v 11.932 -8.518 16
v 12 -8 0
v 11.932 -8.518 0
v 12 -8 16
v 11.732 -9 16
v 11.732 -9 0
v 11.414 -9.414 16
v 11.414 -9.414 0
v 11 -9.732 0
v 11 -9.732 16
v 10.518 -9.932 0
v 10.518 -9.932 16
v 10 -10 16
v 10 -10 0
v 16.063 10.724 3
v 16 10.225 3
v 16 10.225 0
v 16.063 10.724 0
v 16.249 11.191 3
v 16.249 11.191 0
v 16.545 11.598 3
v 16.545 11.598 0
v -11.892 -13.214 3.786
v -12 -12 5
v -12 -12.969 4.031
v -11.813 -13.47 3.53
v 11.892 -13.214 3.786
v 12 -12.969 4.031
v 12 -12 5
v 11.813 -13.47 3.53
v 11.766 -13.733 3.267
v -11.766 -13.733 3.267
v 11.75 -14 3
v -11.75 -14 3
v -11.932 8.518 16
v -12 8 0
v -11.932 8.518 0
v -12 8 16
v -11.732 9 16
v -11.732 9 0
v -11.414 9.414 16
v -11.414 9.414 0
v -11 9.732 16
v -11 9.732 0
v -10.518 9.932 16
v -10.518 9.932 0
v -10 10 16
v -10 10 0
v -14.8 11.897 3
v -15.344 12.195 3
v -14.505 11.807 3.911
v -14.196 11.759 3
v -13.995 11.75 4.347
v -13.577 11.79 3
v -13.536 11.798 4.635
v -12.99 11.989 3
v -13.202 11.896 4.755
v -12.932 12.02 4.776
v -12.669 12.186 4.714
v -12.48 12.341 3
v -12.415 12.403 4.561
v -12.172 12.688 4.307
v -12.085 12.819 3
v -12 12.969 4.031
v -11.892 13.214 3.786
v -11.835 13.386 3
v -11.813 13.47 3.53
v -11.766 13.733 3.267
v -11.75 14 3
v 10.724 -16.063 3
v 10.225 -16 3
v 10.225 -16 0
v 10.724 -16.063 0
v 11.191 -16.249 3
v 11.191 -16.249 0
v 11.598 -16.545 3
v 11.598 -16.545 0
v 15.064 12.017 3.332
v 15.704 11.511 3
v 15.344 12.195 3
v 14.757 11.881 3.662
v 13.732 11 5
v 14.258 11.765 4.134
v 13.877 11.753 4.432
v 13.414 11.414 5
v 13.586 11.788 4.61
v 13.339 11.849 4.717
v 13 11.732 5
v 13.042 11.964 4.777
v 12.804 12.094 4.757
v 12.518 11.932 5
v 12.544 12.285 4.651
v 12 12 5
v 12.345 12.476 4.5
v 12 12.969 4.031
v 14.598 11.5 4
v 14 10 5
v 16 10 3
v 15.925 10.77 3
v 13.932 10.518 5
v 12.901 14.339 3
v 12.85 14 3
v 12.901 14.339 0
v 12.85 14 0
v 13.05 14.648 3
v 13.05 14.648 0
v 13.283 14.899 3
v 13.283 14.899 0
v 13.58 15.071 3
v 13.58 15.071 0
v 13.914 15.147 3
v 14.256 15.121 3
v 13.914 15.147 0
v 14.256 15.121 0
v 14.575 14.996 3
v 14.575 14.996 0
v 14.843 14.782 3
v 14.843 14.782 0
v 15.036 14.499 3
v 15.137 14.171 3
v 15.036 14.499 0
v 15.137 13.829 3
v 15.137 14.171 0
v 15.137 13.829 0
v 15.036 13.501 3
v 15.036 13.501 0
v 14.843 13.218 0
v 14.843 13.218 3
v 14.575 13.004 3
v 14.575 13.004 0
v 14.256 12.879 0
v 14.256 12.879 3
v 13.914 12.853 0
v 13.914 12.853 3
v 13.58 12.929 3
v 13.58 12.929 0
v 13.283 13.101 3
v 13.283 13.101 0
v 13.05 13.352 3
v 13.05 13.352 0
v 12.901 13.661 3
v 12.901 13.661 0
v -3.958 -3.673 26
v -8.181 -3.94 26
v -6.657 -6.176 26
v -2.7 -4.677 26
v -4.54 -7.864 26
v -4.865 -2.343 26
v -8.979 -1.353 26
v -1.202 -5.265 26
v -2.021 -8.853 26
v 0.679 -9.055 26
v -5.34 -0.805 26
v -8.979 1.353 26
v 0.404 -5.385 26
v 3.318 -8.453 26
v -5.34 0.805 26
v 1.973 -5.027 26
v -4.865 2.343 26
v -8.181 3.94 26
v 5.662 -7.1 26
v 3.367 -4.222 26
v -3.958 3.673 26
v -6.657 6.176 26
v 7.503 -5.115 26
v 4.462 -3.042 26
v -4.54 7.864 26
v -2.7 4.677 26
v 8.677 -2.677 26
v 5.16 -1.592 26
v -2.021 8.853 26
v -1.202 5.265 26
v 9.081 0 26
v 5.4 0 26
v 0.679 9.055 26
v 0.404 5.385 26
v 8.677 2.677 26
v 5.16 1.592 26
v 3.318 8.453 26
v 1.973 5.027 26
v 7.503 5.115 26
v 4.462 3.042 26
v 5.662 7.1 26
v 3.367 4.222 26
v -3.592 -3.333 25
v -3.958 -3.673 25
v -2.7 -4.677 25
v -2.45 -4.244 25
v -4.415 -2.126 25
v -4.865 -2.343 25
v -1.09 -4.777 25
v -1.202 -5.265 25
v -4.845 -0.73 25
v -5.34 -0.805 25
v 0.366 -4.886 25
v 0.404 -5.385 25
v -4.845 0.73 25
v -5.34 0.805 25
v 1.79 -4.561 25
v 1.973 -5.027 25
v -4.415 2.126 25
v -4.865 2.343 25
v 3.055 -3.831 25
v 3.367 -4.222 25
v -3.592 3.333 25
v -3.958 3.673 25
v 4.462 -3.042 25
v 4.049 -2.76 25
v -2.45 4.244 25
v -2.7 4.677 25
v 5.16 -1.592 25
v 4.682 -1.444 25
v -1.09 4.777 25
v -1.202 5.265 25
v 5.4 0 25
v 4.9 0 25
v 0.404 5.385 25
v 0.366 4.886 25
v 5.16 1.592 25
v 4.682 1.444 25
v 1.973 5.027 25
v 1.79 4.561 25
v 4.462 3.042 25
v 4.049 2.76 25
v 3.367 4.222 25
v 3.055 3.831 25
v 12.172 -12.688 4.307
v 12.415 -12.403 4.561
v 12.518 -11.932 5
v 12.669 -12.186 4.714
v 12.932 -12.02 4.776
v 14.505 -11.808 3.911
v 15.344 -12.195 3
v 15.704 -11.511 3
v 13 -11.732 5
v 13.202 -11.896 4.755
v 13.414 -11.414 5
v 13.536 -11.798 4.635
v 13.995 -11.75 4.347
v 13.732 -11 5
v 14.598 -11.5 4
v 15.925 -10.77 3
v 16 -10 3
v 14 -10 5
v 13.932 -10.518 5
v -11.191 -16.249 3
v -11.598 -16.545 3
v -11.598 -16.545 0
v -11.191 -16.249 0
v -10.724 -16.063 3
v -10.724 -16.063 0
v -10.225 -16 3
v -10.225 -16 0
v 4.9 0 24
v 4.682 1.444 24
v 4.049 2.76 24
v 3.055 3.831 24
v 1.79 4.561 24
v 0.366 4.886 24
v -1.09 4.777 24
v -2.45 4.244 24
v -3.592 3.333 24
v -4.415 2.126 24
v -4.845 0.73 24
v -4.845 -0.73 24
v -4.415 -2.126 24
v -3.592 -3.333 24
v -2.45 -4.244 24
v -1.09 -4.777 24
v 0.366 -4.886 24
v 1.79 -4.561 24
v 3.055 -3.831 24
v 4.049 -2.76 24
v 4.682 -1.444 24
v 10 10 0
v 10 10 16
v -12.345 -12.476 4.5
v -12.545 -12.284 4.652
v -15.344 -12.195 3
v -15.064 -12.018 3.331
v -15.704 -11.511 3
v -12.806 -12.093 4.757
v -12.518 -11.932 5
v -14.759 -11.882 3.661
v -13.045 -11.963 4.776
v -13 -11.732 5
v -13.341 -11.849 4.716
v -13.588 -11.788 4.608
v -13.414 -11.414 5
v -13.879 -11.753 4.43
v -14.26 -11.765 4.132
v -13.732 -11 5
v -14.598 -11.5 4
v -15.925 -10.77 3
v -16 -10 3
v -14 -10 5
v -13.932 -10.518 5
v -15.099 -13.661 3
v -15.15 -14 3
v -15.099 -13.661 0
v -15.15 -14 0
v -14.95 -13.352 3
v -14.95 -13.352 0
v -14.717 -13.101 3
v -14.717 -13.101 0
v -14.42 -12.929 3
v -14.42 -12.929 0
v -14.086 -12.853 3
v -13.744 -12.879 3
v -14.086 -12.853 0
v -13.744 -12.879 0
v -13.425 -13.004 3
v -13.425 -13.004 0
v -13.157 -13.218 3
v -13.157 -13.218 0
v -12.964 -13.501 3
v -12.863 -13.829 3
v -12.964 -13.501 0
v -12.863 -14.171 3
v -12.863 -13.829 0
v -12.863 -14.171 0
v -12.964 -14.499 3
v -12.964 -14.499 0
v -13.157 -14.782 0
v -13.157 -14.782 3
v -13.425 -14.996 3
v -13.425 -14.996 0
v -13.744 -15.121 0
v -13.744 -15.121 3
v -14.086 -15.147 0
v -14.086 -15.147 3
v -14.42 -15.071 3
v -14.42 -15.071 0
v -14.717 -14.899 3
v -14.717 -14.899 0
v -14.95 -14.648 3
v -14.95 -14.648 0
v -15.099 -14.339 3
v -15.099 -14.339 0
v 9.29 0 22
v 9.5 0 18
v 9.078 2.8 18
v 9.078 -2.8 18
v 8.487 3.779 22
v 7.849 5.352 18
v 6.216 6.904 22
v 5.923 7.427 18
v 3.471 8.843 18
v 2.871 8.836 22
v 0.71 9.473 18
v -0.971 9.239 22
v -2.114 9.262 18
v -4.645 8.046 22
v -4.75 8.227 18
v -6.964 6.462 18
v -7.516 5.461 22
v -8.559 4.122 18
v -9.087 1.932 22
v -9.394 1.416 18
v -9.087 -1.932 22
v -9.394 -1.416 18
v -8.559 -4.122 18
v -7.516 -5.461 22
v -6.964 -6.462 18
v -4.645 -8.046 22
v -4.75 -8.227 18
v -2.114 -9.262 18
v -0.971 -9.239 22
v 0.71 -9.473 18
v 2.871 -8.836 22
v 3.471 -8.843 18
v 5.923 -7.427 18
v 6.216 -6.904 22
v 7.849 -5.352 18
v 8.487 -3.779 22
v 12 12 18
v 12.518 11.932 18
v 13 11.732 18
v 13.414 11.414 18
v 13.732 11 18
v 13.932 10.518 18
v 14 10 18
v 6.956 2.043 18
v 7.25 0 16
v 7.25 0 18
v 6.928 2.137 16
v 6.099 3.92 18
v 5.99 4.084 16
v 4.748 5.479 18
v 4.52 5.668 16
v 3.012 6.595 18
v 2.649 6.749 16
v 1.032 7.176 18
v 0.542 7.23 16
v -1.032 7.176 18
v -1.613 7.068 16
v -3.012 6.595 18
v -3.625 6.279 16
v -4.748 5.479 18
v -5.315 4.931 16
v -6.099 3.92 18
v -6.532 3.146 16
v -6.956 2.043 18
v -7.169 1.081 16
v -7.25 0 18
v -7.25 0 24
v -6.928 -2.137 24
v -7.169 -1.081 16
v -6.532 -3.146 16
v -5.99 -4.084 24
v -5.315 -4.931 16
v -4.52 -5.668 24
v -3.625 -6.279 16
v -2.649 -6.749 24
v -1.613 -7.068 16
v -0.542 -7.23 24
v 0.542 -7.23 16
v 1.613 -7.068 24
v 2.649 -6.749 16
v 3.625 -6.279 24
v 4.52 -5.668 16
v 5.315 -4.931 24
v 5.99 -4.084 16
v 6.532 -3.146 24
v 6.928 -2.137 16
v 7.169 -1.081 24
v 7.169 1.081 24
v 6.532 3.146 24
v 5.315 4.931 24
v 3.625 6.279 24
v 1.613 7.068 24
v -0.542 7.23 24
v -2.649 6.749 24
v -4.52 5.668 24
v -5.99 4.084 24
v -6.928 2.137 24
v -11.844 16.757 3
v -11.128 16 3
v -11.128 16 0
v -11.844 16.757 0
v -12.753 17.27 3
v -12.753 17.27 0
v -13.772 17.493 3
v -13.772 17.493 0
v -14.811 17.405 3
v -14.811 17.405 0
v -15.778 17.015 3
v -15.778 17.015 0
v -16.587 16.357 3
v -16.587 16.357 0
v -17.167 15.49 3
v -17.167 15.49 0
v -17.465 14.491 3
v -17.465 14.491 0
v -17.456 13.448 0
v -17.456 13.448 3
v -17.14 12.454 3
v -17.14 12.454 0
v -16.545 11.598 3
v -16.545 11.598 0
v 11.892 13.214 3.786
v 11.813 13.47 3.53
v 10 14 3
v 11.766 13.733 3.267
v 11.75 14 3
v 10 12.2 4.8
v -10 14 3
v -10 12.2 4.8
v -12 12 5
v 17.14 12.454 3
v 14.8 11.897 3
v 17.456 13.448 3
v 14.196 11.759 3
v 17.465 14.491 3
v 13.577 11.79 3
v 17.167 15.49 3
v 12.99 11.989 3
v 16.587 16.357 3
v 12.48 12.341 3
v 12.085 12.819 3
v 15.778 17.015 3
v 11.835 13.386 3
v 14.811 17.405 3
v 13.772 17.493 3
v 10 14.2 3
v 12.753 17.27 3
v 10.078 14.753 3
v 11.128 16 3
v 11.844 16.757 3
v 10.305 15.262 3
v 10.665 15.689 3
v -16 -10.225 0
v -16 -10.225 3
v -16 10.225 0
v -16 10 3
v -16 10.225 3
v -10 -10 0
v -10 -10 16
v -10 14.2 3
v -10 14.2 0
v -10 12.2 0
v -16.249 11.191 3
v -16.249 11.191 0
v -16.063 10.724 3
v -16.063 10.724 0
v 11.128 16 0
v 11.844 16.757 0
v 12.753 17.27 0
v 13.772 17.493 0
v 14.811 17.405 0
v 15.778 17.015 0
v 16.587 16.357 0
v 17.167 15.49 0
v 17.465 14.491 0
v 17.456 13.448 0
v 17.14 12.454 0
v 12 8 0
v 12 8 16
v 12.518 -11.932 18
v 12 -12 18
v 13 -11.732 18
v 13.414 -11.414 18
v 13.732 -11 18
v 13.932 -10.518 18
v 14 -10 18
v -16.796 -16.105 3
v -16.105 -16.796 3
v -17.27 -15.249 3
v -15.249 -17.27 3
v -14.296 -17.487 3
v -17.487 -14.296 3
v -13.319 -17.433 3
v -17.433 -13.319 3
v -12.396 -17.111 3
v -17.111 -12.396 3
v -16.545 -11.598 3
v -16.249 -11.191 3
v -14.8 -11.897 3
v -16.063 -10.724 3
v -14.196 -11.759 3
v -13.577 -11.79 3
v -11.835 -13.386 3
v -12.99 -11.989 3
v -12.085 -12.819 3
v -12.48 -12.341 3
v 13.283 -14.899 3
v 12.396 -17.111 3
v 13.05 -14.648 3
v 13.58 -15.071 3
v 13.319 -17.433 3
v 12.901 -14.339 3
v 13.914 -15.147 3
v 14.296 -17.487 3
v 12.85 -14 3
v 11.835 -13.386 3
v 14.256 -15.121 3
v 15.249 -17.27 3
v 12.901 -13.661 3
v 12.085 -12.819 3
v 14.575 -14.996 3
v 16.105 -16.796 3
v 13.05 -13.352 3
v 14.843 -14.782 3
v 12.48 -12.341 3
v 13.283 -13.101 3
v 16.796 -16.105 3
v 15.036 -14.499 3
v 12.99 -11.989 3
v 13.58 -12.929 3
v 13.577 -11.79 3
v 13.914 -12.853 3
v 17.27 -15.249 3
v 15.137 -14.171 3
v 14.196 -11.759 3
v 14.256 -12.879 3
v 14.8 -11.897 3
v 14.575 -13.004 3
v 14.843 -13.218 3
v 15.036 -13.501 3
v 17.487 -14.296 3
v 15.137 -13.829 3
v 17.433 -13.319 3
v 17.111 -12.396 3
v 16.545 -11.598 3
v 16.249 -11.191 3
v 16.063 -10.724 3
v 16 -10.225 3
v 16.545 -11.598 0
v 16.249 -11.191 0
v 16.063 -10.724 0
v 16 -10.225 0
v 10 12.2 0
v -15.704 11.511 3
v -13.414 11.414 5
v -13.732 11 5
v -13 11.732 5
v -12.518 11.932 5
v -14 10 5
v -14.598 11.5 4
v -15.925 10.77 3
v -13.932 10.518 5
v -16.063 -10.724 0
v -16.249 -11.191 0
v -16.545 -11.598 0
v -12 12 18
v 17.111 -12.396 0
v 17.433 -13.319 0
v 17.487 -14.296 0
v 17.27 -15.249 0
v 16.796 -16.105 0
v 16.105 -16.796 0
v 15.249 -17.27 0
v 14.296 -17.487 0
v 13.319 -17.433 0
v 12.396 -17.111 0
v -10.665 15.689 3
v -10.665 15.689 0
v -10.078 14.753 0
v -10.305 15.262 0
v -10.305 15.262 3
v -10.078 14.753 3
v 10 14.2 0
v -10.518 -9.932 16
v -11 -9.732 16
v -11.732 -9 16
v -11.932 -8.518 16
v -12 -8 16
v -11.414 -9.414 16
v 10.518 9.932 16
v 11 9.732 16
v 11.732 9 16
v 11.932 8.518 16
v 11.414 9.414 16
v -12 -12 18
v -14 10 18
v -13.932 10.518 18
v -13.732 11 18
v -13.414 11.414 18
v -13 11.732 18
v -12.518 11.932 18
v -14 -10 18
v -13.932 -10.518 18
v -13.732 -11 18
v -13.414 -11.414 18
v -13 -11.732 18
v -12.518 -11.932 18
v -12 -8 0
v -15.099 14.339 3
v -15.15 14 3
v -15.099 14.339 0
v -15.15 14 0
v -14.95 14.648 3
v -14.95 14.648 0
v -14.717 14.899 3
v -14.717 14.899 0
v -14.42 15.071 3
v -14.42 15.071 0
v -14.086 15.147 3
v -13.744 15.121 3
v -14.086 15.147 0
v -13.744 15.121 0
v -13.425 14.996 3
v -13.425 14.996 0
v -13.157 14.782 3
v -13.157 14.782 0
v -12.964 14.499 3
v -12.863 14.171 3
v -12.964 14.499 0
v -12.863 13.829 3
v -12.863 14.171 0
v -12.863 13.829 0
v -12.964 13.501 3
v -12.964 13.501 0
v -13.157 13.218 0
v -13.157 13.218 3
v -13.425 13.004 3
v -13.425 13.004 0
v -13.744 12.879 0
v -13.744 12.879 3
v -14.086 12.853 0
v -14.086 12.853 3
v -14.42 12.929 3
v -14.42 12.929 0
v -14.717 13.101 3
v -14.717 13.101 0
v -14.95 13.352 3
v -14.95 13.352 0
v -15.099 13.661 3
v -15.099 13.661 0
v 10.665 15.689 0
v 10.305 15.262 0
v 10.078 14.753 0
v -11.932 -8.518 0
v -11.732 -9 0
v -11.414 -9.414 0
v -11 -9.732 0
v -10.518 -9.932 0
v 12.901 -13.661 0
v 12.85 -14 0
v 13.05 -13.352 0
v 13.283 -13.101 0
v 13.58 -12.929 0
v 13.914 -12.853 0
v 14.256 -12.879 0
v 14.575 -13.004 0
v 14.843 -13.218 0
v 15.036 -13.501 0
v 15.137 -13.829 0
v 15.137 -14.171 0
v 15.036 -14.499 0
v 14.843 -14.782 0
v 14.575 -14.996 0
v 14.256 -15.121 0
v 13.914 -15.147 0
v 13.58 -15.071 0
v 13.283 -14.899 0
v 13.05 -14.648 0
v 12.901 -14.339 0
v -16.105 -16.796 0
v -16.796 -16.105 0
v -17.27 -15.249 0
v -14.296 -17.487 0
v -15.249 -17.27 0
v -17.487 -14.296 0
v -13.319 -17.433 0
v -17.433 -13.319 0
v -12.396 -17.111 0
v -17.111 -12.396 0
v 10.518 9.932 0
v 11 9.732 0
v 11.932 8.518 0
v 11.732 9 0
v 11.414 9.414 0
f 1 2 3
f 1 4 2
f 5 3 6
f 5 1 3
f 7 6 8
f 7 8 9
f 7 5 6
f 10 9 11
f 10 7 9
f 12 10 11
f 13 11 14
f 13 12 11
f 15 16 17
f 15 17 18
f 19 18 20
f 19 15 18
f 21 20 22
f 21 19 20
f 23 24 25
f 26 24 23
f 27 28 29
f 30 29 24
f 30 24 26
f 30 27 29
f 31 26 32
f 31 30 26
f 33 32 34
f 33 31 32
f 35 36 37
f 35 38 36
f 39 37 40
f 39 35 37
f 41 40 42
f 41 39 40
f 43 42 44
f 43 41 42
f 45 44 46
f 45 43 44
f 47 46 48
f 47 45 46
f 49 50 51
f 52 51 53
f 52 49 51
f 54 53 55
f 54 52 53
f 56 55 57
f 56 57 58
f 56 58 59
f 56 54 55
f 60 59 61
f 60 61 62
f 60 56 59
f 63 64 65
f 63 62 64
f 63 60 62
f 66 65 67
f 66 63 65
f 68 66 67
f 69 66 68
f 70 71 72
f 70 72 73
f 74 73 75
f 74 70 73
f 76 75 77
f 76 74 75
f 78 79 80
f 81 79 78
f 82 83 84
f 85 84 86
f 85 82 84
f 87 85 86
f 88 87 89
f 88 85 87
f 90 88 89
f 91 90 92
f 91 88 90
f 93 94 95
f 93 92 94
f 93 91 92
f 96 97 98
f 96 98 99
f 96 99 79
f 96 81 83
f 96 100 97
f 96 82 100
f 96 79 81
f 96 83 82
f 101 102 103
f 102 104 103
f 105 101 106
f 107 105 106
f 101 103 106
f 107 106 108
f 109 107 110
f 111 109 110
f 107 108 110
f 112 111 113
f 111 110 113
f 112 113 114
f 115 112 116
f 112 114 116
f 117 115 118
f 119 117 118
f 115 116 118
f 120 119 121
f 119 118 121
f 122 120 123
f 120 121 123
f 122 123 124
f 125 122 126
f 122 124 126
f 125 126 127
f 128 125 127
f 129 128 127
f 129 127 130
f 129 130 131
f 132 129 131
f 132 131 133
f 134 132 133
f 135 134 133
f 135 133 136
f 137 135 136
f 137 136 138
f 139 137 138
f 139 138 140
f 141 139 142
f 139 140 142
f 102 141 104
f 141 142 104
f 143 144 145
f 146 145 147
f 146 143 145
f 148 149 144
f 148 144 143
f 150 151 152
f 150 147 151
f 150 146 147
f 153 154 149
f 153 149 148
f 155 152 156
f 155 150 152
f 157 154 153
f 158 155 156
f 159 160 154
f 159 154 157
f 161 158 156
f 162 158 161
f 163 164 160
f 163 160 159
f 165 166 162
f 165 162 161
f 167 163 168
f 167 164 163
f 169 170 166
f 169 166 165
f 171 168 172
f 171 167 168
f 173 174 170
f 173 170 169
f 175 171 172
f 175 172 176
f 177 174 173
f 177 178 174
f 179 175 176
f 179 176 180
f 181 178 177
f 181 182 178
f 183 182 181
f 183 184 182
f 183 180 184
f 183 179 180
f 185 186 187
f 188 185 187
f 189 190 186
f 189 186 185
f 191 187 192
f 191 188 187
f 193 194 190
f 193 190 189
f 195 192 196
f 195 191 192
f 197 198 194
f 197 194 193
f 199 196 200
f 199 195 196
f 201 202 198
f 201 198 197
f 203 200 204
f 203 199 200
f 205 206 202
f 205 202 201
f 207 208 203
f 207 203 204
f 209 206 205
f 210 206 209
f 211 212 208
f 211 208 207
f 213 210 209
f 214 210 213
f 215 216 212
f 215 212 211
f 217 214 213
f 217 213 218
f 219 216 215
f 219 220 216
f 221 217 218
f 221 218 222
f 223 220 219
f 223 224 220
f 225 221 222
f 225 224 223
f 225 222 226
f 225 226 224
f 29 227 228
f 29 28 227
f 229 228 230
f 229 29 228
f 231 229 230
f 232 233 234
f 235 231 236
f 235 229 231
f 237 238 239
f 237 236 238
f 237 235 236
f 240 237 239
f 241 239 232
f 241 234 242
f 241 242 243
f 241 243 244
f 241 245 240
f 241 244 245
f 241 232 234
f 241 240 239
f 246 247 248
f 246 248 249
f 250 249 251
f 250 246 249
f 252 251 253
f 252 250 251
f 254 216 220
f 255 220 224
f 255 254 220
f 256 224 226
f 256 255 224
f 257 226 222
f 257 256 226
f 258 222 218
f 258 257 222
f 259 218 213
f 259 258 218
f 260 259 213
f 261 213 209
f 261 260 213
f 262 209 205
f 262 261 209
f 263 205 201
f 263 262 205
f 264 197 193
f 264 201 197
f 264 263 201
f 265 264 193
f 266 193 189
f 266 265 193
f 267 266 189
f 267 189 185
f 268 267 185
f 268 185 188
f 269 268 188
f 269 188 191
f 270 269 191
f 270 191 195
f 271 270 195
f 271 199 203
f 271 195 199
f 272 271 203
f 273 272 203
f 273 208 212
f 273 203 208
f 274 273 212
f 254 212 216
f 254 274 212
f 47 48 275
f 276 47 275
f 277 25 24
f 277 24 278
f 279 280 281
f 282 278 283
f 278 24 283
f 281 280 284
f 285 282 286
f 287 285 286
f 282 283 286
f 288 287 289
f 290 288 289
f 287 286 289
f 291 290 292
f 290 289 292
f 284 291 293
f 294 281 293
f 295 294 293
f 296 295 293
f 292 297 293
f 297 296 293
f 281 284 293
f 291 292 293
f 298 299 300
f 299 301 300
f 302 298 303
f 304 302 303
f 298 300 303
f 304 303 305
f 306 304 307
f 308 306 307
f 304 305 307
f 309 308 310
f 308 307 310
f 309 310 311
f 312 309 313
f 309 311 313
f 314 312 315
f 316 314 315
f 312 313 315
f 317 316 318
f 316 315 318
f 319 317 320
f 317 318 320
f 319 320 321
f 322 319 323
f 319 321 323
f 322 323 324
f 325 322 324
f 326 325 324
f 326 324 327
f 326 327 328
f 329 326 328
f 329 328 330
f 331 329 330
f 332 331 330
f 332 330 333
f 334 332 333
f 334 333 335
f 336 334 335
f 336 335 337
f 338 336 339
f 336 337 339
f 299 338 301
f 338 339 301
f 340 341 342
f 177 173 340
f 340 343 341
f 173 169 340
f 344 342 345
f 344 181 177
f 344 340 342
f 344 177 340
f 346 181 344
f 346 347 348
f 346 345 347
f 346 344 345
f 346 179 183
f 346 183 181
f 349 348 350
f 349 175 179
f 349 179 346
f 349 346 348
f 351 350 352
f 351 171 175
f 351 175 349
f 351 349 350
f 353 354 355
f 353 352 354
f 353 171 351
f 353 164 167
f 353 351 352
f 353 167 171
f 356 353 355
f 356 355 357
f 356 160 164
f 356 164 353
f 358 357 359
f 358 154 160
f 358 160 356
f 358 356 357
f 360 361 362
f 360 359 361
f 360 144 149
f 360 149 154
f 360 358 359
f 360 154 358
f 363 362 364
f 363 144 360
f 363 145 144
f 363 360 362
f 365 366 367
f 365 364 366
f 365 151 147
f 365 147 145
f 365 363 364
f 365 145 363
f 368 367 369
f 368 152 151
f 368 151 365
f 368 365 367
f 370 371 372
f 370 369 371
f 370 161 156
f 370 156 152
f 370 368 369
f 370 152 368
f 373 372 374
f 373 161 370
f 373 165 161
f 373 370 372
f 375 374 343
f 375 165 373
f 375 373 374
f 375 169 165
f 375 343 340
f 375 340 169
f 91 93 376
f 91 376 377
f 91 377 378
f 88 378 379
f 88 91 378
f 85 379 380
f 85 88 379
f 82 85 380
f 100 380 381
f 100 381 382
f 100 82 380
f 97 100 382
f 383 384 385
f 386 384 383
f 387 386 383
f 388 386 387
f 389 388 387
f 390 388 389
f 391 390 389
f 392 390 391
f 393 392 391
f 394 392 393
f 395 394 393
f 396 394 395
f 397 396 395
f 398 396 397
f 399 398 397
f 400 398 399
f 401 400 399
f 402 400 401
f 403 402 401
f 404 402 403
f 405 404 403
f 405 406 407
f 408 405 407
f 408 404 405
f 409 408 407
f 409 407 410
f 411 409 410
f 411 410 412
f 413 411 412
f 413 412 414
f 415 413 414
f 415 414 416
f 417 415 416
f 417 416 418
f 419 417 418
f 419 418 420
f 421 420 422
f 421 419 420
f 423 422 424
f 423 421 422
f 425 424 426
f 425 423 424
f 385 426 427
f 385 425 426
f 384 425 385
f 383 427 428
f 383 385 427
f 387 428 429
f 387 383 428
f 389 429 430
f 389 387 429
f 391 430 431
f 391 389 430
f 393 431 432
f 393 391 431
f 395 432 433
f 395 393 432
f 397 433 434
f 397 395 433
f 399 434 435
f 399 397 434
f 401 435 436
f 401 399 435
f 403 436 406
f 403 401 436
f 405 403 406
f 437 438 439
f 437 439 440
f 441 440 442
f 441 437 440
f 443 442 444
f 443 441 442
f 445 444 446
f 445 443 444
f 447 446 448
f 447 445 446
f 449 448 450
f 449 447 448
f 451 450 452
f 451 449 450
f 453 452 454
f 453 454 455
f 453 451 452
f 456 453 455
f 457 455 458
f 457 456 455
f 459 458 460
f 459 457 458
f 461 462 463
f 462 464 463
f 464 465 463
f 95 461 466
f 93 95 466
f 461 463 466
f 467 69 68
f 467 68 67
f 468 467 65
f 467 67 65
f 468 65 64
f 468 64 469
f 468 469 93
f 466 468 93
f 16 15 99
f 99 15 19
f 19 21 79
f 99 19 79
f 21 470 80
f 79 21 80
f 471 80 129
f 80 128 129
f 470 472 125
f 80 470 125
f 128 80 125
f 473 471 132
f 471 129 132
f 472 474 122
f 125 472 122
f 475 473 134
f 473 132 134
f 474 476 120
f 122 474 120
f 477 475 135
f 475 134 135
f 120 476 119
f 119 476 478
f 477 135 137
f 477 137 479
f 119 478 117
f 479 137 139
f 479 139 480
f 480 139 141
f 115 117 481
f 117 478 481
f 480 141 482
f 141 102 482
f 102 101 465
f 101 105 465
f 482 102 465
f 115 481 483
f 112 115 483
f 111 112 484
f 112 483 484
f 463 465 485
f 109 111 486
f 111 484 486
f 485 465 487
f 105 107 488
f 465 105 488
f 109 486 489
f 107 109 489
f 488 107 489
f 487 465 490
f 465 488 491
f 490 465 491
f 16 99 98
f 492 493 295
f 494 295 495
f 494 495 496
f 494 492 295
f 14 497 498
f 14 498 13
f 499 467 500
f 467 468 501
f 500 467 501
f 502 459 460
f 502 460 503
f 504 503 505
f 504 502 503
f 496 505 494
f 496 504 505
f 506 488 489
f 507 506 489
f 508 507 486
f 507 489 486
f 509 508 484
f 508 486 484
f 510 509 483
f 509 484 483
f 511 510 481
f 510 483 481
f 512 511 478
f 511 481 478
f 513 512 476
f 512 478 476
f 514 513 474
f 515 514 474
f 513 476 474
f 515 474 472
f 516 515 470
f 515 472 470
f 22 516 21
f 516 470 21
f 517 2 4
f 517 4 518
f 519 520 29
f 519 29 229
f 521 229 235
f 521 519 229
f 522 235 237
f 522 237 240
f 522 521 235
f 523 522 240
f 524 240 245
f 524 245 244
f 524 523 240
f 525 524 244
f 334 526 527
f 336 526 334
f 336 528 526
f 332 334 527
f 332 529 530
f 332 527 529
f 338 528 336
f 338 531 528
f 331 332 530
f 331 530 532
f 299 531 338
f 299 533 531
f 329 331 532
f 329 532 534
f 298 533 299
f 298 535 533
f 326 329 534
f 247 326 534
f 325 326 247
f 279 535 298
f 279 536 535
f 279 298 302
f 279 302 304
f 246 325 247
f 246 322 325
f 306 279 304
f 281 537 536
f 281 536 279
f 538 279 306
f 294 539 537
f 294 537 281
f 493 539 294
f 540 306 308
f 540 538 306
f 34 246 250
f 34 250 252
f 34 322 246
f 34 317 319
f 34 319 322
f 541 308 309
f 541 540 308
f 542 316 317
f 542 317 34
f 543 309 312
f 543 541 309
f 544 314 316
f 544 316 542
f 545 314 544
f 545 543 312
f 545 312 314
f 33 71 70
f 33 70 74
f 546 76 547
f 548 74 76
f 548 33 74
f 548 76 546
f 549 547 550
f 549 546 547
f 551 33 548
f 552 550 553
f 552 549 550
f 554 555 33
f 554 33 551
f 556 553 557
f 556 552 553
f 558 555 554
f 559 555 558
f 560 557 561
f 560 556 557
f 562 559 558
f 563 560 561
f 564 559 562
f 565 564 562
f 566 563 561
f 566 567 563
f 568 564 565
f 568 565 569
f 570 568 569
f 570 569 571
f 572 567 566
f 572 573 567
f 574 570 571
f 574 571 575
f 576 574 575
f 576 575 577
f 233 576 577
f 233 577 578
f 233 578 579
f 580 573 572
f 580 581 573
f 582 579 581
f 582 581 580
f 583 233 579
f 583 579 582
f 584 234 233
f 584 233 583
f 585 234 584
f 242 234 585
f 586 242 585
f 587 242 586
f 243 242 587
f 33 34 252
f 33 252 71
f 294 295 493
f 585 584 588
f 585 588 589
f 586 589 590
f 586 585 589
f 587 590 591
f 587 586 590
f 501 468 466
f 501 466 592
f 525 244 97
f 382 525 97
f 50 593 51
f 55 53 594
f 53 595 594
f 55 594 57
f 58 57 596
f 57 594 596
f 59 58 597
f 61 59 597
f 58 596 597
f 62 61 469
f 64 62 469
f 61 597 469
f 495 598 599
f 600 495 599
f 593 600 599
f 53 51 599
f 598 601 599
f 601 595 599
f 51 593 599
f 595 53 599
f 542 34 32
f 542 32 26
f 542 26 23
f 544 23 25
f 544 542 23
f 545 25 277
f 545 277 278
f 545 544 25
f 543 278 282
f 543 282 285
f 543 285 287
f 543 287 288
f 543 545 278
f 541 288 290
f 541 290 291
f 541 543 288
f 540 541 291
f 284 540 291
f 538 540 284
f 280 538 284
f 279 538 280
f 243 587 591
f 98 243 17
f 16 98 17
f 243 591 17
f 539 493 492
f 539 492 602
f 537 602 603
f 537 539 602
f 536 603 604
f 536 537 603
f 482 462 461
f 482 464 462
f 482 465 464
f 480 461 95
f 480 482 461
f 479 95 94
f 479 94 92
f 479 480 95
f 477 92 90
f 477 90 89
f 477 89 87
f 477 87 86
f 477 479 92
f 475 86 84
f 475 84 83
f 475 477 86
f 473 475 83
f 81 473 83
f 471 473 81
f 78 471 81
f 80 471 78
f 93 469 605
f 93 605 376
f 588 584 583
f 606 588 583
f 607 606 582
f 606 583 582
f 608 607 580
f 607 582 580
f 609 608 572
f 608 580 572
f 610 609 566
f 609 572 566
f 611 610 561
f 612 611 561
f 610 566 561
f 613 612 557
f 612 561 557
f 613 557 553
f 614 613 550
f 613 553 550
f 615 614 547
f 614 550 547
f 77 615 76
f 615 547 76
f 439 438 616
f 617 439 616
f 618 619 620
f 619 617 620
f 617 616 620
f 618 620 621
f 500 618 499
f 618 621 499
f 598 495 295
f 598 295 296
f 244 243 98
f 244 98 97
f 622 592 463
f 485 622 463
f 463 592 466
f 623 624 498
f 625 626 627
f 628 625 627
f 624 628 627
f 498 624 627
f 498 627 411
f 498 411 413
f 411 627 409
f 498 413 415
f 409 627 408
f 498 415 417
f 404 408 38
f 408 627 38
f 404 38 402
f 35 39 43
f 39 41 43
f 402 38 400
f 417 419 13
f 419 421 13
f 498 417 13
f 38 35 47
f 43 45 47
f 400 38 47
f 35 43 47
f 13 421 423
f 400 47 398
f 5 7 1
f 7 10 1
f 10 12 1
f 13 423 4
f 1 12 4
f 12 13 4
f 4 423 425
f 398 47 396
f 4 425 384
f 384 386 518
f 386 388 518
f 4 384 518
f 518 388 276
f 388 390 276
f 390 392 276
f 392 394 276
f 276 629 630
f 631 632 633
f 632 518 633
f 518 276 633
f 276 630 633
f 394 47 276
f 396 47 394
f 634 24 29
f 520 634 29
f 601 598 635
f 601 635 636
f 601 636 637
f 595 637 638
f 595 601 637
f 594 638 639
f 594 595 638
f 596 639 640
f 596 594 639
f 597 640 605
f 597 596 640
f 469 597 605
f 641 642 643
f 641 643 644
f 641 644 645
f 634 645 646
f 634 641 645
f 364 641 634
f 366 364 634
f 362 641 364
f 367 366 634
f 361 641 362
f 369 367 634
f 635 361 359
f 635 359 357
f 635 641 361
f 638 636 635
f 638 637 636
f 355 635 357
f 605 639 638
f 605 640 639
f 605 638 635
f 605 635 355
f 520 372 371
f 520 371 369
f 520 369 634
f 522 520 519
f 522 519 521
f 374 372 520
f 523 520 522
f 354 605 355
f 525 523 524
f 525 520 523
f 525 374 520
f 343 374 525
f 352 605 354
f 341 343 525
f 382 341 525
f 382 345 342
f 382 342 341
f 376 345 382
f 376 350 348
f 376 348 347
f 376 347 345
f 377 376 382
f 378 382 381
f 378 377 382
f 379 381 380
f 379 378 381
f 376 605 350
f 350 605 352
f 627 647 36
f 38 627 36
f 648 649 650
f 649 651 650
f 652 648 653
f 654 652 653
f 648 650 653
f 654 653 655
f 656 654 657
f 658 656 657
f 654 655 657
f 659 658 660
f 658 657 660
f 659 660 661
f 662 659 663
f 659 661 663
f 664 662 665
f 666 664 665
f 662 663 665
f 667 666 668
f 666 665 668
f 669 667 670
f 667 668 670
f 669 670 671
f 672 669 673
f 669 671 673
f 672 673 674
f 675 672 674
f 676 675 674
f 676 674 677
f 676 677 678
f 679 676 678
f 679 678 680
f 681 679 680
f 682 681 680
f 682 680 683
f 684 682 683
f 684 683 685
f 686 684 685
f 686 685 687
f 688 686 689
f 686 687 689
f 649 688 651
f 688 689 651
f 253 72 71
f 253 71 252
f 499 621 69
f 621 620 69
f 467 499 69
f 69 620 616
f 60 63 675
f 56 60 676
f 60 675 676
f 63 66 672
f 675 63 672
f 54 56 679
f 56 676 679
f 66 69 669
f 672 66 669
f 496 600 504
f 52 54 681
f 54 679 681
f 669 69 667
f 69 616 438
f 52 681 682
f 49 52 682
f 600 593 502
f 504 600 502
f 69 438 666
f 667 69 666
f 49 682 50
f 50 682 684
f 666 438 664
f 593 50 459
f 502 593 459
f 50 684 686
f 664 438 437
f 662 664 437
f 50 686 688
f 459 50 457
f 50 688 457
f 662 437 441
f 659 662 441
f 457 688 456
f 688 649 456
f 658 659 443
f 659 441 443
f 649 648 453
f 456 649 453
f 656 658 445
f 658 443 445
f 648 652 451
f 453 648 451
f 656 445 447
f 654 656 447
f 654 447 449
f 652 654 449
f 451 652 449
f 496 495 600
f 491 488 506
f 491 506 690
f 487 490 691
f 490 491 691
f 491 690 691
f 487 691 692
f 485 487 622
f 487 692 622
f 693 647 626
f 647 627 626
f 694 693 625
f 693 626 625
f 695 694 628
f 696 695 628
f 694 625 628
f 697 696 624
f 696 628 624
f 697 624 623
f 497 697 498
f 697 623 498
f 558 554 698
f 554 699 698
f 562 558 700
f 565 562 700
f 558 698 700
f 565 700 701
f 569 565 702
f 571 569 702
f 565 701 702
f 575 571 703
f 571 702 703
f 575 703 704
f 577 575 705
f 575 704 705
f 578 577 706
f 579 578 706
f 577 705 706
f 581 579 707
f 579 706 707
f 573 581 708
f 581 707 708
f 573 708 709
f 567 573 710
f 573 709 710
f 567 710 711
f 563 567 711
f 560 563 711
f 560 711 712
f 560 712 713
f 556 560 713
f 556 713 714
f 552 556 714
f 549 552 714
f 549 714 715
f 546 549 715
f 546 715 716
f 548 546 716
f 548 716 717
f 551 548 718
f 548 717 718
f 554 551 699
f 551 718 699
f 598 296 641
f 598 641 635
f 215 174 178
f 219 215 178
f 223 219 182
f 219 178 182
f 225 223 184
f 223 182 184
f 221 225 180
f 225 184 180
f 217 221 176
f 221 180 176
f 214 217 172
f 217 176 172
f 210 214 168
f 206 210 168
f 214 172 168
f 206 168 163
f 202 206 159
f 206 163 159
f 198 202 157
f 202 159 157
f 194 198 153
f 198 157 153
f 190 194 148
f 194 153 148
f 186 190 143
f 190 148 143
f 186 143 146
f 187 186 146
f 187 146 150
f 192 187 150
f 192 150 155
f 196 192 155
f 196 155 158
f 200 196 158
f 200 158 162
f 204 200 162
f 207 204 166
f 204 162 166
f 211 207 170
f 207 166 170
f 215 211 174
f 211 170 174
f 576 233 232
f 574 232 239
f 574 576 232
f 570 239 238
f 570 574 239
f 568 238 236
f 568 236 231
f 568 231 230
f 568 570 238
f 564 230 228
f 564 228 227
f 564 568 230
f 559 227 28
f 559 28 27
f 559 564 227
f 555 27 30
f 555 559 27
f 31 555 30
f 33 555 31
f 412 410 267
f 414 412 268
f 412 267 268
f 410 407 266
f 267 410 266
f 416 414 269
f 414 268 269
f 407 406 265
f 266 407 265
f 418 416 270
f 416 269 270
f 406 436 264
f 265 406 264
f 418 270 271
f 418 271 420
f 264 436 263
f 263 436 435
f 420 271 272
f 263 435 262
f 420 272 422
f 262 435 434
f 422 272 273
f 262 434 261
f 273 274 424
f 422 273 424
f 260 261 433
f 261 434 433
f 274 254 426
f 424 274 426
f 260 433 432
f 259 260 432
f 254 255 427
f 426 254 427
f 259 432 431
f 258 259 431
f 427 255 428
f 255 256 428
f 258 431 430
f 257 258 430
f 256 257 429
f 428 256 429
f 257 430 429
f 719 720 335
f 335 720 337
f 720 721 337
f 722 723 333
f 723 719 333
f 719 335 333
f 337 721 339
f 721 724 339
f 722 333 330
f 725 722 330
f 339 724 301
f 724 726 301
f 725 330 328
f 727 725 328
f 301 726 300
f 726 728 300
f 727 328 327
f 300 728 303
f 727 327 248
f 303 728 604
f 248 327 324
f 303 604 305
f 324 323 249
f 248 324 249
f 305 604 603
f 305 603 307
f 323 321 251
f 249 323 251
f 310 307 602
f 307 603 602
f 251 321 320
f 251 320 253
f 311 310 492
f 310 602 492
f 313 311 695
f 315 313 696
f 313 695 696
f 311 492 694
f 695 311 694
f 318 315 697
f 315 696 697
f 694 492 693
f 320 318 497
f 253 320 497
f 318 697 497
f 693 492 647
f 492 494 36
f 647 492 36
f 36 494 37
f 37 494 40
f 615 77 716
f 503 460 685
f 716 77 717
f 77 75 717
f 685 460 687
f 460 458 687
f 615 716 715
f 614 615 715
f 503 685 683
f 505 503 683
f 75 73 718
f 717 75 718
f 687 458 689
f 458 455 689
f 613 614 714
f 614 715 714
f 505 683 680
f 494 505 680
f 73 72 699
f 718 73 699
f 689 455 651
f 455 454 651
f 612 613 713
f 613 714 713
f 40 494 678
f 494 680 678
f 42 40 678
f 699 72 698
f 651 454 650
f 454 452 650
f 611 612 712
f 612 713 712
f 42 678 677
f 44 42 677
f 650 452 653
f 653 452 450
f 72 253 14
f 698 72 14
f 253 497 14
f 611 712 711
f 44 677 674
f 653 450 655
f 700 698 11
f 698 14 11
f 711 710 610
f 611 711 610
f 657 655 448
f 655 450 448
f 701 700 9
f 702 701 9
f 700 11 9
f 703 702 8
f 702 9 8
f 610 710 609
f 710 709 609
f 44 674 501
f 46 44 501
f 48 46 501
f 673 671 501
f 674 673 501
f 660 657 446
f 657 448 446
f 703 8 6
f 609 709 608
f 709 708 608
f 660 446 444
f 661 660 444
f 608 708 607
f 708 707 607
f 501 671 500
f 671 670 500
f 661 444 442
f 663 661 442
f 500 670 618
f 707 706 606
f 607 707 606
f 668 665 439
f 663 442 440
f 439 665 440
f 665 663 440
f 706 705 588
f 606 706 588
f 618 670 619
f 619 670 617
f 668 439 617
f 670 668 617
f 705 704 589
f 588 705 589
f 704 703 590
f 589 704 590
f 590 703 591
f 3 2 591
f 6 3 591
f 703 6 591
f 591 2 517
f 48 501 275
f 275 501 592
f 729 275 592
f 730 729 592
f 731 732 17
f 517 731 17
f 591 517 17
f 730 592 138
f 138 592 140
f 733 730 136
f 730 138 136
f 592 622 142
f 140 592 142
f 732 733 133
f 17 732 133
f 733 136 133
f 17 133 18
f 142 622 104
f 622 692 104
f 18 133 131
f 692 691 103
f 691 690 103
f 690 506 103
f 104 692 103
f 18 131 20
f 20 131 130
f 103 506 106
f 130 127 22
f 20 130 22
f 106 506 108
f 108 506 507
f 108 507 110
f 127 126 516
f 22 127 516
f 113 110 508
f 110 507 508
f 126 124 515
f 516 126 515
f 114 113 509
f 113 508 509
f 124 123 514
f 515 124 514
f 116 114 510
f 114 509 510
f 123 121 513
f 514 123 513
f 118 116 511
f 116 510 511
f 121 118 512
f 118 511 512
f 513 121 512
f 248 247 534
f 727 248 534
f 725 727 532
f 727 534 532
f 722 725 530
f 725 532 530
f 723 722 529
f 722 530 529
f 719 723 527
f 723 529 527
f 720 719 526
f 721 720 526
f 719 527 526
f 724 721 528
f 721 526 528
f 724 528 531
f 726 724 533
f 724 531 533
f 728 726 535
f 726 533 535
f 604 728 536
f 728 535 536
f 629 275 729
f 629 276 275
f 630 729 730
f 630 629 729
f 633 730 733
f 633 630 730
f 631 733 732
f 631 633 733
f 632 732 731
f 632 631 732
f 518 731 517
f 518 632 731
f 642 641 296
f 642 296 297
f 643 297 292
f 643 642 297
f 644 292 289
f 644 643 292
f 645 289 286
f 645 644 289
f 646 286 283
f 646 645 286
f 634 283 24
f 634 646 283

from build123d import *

# Parameters (mm, degrees)
SKETCH_1_W          = 28
SKETCH_1_H          = 24
SKETCH_1_W_2        = 24
SKETCH_1_H_2        = 20
EXTRUDE_1_DEPTH     = 16
SKETCH_2_W          = 32
SKETCH_2_H          = 32
SKETCH_2_R          = 1.15
SKETCH_2_W_2        = 28
SKETCH_2_H_2        = 24
EXTRUDE_2_DEPTH     = 3
SKETCH_3_W          = 28
SKETCH_3_H          = 24
SKETCH_3_R          = 7.25
EXTRUDE_3_DEPTH     = 2
SKETCH_4_R          = 9.5
EXTRUDE_4_DEPTH     = 8
EXTRUDE_4_TAPER     = 3
SKETCH_6_R          = 7.25
CUT_EXTRUDE_2_DEPTH = 29.91366459
EXTRUDE_START       = -2
SKETCH_5_R          = 7.25
SKETCH_5_R_2        = 4.9
EXTRUDE_5_DEPTH     = 2
SKETCH_9_R          = 5.4
CUT_EXTRUDE_5_DEPTH = 1
FILLET_1_R          = 2
CUT_EXTRUDE_3_REACH = 36.467
SKETCH_7_W          = 20
SKETCH_7_H          = 5
CHAMFER_1_SIZE      = 2
SKETCH_8_R          = 2.25
CUT_EXTRUDE_4_DEPTH = 10
EXTRUDE_6_DEPTH     = 3
FILLET_2_R          = 2


with BuildPart() as part:
    # 草图1 → 凸台-拉伸1 (new body)
    with BuildSketch(Plane.XY):
        Rectangle(SKETCH_1_W, SKETCH_1_H)
        Rectangle(SKETCH_1_W_2, SKETCH_1_H_2, mode=Mode.SUBTRACT)
    extrude(amount=EXTRUDE_1_DEPTH)

    # 草图2 → 凸台-拉伸2 (add)
    with BuildSketch(Plane(origin=(0, 0, 0), x_dir=(-1, 0, 0), z_dir=(0, 0, -1))):
        Rectangle(SKETCH_2_W, SKETCH_2_H)
        with Locations((14, 14)):
            Circle(SKETCH_2_R, mode=Mode.SUBTRACT)
        with Locations((14, -14)):
            Circle(SKETCH_2_R, mode=Mode.SUBTRACT)
        with Locations((-14, -14)):
            Circle(SKETCH_2_R, mode=Mode.SUBTRACT)
        with Locations((-14, 14)):
            Circle(SKETCH_2_R, mode=Mode.SUBTRACT)
        Rectangle(SKETCH_2_W_2, SKETCH_2_H_2, mode=Mode.SUBTRACT)
    extrude(amount=-EXTRUDE_2_DEPTH)

    # 草图3 → 凸台-拉伸3 (add)
    with BuildSketch(Plane.XY.offset(16)):
        Rectangle(SKETCH_3_W, SKETCH_3_H)
        Circle(SKETCH_3_R, mode=Mode.SUBTRACT)
    extrude(amount=EXTRUDE_3_DEPTH)

    # 草图4 → 凸台-拉伸4 (add)
    with BuildSketch(Plane.XY.offset(18)):
        Circle(SKETCH_4_R)
    extrude(amount=EXTRUDE_4_DEPTH, taper=EXTRUDE_4_TAPER)

    # 草图6 → 切除-拉伸2 (cut, through all)
    with BuildSketch(Plane(origin=(0, 0, 18), x_dir=(-1, 0, 0), z_dir=(0, 0, -1))):
        Circle(SKETCH_6_R)
    extrude(amount=-CUT_EXTRUDE_2_DEPTH, mode=Mode.SUBTRACT)

    # 草图5 → 凸台-拉伸5 (add)
    with BuildSketch(Plane.XY.offset(26).offset(EXTRUDE_START)):
        Circle(SKETCH_5_R)
        Circle(SKETCH_5_R_2, mode=Mode.SUBTRACT)
    extrude(amount=EXTRUDE_5_DEPTH)

    # 草图9 → 切除-拉伸5 (cut)
    with BuildSketch(Plane.XY.offset(26)):
        Circle(SKETCH_9_R)
    extrude(amount=-CUT_EXTRUDE_5_DEPTH, mode=Mode.SUBTRACT)

    # 圆角1
    fillet_1_edges = [part.edges().sort_by_distance(p)[0] for p in [
        (12, -10, 8),
        (12, 10, 8),
        (-12, 10, 8),
        (-12, -10, 8),
        (14, -12, 10.5),
        (-14, -12, 10.5),
        (-14, 12, 10.5),
        (14, 12, 10.5),
    ]]
    fillet(fillet_1_edges, radius=FILLET_1_R)

    # 草图7 → 切除-拉伸3 (cut, up to next)
    with BuildSketch(Plane(origin=(0, 0, 0), x_dir=(-1, 0, 0), z_dir=(0, 0, -1)), mode=Mode.PRIVATE) as cut_extrude_3_sk1:
        with Locations((0, 14.7)):
            Rectangle(SKETCH_7_W, SKETCH_7_H)
    cut_extrude_3_tool1 = extrude(cut_extrude_3_sk1.sketch, amount=-CUT_EXTRUDE_3_REACH, mode=Mode.PRIVATE) & part.part
    add(cut_extrude_3_tool1.solids().sort_by_distance((0, 14.7, 0))[0], mode=Mode.SUBTRACT)

    # 倒角1
    # the kernel refuses this chamfer: 2 mm, written as the material it adds along each edge
    with BuildSketch(Plane(origin=(-12, 12, 3), x_dir=(0, 1, 0), z_dir=(1, 0, 0))) as chamfer_1_piece_1_section:
        Polygon((CHAMFER_1_SIZE, 0), (0, CHAMFER_1_SIZE), (0, 0), align=None)
    chamfer_1_piece_1 = extrude(amount=24, mode=Mode.PRIVATE)
    chamfer_1_piece_1 = split(chamfer_1_piece_1, bisect_by=Plane(origin=(-12, 12.2, 3), z_dir=(0, 1, 0)), keep=Keep.TOP, mode=Mode.PRIVATE)
    chamfer_1_piece_1 = split(chamfer_1_piece_1, bisect_by=Plane(origin=(-10, 12, 3), z_dir=(-1, 0, 0)), keep=Keep.TOP, mode=Mode.PRIVATE)
    add(chamfer_1_piece_1)
    with BuildSketch(Plane(origin=(-12, 12, 3), x_dir=(0, 1, 0), z_dir=(1, 0, 0))) as chamfer_1_piece_2_section:
        Polygon((CHAMFER_1_SIZE, 0), (0, CHAMFER_1_SIZE), (0, 0), align=None)
    chamfer_1_piece_2 = extrude(amount=24, mode=Mode.PRIVATE)
    chamfer_1_piece_2 = split(chamfer_1_piece_2, bisect_by=Plane(origin=(-12, 12.2, 3), z_dir=(0, -1, 0)), keep=Keep.TOP, mode=Mode.PRIVATE)
    chamfer_1_piece_2 = split(chamfer_1_piece_2, bisect_by=Plane(origin=(-10, 12, 3), z_dir=(-1, 0, 0)), keep=Keep.TOP, mode=Mode.PRIVATE)
    add(chamfer_1_piece_2)
    with BuildSketch(Plane(origin=(-12, 12, 3), x_dir=(0, 1, 0), z_dir=(1, 0, 0))) as chamfer_1_piece_3_section:
        Polygon((CHAMFER_1_SIZE, 0), (0, CHAMFER_1_SIZE), (0, 0), align=None)
    chamfer_1_piece_3 = extrude(amount=24, mode=Mode.PRIVATE)
    chamfer_1_piece_3 = split(chamfer_1_piece_3, bisect_by=Plane(origin=(10, 12, 3), z_dir=(-1, 0, 0)), keep=Keep.TOP, mode=Mode.PRIVATE)
    chamfer_1_piece_3 = split(chamfer_1_piece_3, bisect_by=Plane(origin=(-12, 12.2, 3), z_dir=(0, -1, 0)), keep=Keep.TOP, mode=Mode.PRIVATE)
    chamfer_1_piece_3 = split(chamfer_1_piece_3, bisect_by=Plane(origin=(-10, 12, 3), z_dir=(1, 0, 0)), keep=Keep.TOP, mode=Mode.PRIVATE)
    add(chamfer_1_piece_3)
    with BuildSketch(Plane(origin=(-12, 12, 3), x_dir=(0, 1, 0), z_dir=(1, 0, 0))) as chamfer_1_piece_4_section:
        Polygon((CHAMFER_1_SIZE, 0), (0, CHAMFER_1_SIZE), (0, 0), align=None)
    chamfer_1_piece_4 = extrude(amount=24, mode=Mode.PRIVATE)
    chamfer_1_piece_4 = split(chamfer_1_piece_4, bisect_by=Plane(origin=(10, 12, 3), z_dir=(1, 0, 0)), keep=Keep.TOP, mode=Mode.PRIVATE)
    chamfer_1_piece_4 = split(chamfer_1_piece_4, bisect_by=Plane(origin=(-12, 12.2, 3), z_dir=(0, 1, 0)), keep=Keep.TOP, mode=Mode.PRIVATE)
    add(chamfer_1_piece_4)
    with BuildSketch(Plane(origin=(-12, 12, 3), x_dir=(0, 1, 0), z_dir=(1, 0, 0))) as chamfer_1_piece_5_section:
        Polygon((CHAMFER_1_SIZE, 0), (0, CHAMFER_1_SIZE), (0, 0), align=None)
    chamfer_1_piece_5 = extrude(amount=24, mode=Mode.PRIVATE)
    chamfer_1_piece_5 = split(chamfer_1_piece_5, bisect_by=Plane(origin=(10, 12, 3), z_dir=(1, 0, 0)), keep=Keep.TOP, mode=Mode.PRIVATE)
    chamfer_1_piece_5 = split(chamfer_1_piece_5, bisect_by=Plane(origin=(-12, 12.2, 3), z_dir=(0, -1, 0)), keep=Keep.TOP, mode=Mode.PRIVATE)
    add(chamfer_1_piece_5)
    with BuildSketch(Plane(origin=(12, 10, 3), x_dir=(1, 0, 0), z_dir=(0, -1, 0))) as chamfer_1_piece_6_section:
        Polygon((2 + CHAMFER_1_SIZE, 0), (2, CHAMFER_1_SIZE), (2, 0), align=None)
    chamfer_1_piece_6 = revolve(axis=Axis((12, 10, 3), (0, 0, 1)), revolution_arc=90, mode=Mode.PRIVATE)
    chamfer_1_piece_6 = split(chamfer_1_piece_6, bisect_by=Plane(origin=(16, 10, 3), z_dir=(-1, 0, 0)), keep=Keep.TOP, mode=Mode.PRIVATE)
    chamfer_1_piece_6 = chamfer_1_piece_6 - Plane(origin=(14, 14, 3), x_dir=(-1, 0, 0), z_dir=(0, 0, -1)) * Cylinder(1.15, 16, mode=Mode.PRIVATE)
    add(chamfer_1_piece_6)
    with BuildSketch(Plane(origin=(-12, 10, 3), x_dir=(-1, 0, 0), z_dir=(0, -1, 0))) as chamfer_1_piece_7_section:
        Polygon((2 + CHAMFER_1_SIZE, 0), (2, -CHAMFER_1_SIZE), (2, 0), align=None)
    chamfer_1_piece_7 = revolve(axis=Axis((-12, 10, 3), (0, 0, -1)), revolution_arc=90, mode=Mode.PRIVATE)
    chamfer_1_piece_7 = split(chamfer_1_piece_7, bisect_by=Plane(origin=(-16, 10, 3), z_dir=(1, 0, 0)), keep=Keep.TOP, mode=Mode.PRIVATE)
    chamfer_1_piece_7 = chamfer_1_piece_7 - Plane(origin=(-14, 14, 3), x_dir=(-1, 0, 0), z_dir=(0, 0, -1)) * Cylinder(1.15, 17, mode=Mode.PRIVATE)
    add(chamfer_1_piece_7)
    with BuildSketch(Plane(origin=(14, 10, 3), x_dir=(1, 0, 0), z_dir=(0, -1, 0))) as chamfer_1_piece_8_section:
        Polygon((CHAMFER_1_SIZE, 0), (0, CHAMFER_1_SIZE), (0, 0), align=None)
    chamfer_1_piece_8 = extrude(amount=20, mode=Mode.PRIVATE)
    chamfer_1_piece_8 = split(chamfer_1_piece_8, bisect_by=Plane(origin=(16, 10, 3), z_dir=(-1, 0, 0)), keep=Keep.TOP, mode=Mode.PRIVATE)
    add(chamfer_1_piece_8)
    with BuildSketch(Plane(origin=(-14, -10, 3), x_dir=(-1, 0, 0), z_dir=(0, 1, 0))) as chamfer_1_piece_9_section:
        Polygon((CHAMFER_1_SIZE, 0), (0, CHAMFER_1_SIZE), (0, 0), align=None)
    chamfer_1_piece_9 = extrude(amount=20, mode=Mode.PRIVATE)
    chamfer_1_piece_9 = split(chamfer_1_piece_9, bisect_by=Plane(origin=(-16, -10, 3), z_dir=(1, 0, 0)), keep=Keep.TOP, mode=Mode.PRIVATE)
    add(chamfer_1_piece_9)
    with BuildSketch(Plane(origin=(12, -10, 3), x_dir=(0, -1, 0), z_dir=(-1, 0, 0))) as chamfer_1_piece_10_section:
        Polygon((2 + CHAMFER_1_SIZE, 0), (2, CHAMFER_1_SIZE), (2, 0), align=None)
    chamfer_1_piece_10 = revolve(axis=Axis((12, -10, 3), (0, 0, 1)), revolution_arc=90, mode=Mode.PRIVATE)
    chamfer_1_piece_10 = split(chamfer_1_piece_10, bisect_by=Plane(origin=(16, -10, 3), z_dir=(-1, 0, 0)), keep=Keep.TOP, mode=Mode.PRIVATE)
    chamfer_1_piece_10 = chamfer_1_piece_10 - Plane(origin=(14, -14, 3), x_dir=(-1, 0, 0), z_dir=(0, 0, -1)) * Cylinder(1.15, 16, mode=Mode.PRIVATE)
    add(chamfer_1_piece_10)
    with BuildSketch(Plane(origin=(-12, -10, 3), x_dir=(0, -1, 0), z_dir=(1, 0, 0))) as chamfer_1_piece_11_section:
        Polygon((2 + CHAMFER_1_SIZE, 0), (2, -CHAMFER_1_SIZE), (2, 0), align=None)
    chamfer_1_piece_11 = revolve(axis=Axis((-12, -10, 3), (0, 0, -1)), revolution_arc=90, mode=Mode.PRIVATE)
    chamfer_1_piece_11 = split(chamfer_1_piece_11, bisect_by=Plane(origin=(-16, -10, 3), z_dir=(1, 0, 0)), keep=Keep.TOP, mode=Mode.PRIVATE)
    chamfer_1_piece_11 = chamfer_1_piece_11 - Plane(origin=(-14, -14, 3), x_dir=(-1, 0, 0), z_dir=(0, 0, -1)) * Cylinder(1.15, 17, mode=Mode.PRIVATE)
    add(chamfer_1_piece_11)
    with BuildSketch(Plane(origin=(12, -12, 3), x_dir=(0, 0, 1), z_dir=(-1, 0, 0))) as chamfer_1_piece_12:
        Polygon((CHAMFER_1_SIZE, 0), (0, -CHAMFER_1_SIZE), (0, 0), align=None)
    extrude(amount=24)

    # 草图8 → 切除-拉伸4 (cut)
    with BuildSketch(Plane.XY.offset(3)):
        with Locations((-14, -14)):
            Circle(SKETCH_8_R)
        with Locations((14, -14)):
            Circle(SKETCH_8_R)
        with Locations((14, 14)):
            Circle(SKETCH_8_R)
        with Locations((-14, 14)):
            Circle(SKETCH_8_R)
    extrude(amount=CUT_EXTRUDE_4_DEPTH, mode=Mode.SUBTRACT)

    # 草图10 → 凸台-拉伸6 (add)
    with BuildSketch(Plane.XY.offset(3)):
        with BuildLine():
            Line((16, -16), (16, -11.127718677))
            ThreePointArc((16, -11.127718677), (16.474873734, -16.474873734), (11.127718677, -16))
            Line((11.127718677, -16), (16, -16))
        make_face()
        with BuildLine():
            Line((-16, -16), (-11.127718677, -16))
            ThreePointArc((-11.127718677, -16), (-16.474873734, -16.474873734), (-16, -11.127718677))
            Line((-16, -11.127718677), (-16, -16))
        make_face()
        with BuildLine():
            Line((-16, 16), (-11.127718677, 16))
            ThreePointArc((-11.127718677, 16), (-16.474873734, 16.474873734), (-16, 11.127718677))
            Line((-16, 11.127718677), (-16, 16))
        make_face()
        with BuildLine():
            Line((16, 16), (11.127718677, 16))
            ThreePointArc((11.127718677, 16), (16.474873734, 16.474873734), (16, 11.127718677))
            Line((16, 11.127718677), (16, 16))
        make_face()
    extrude(amount=-EXTRUDE_6_DEPTH)

    # 圆角2
    # the kernel refuses this fillet: 2 mm, written as the material it adds along each edge
    with BuildSketch(Plane(origin=(16, -11.127718677, 3), x_dir=(0, 1, 0), z_dir=(0, 0, -1)), Plane(origin=(-11.127718677, -16, 3), x_dir=(1, 0, 0), z_dir=(0, 0, -1)), Plane(origin=(-16, 11.127718677, 3), x_dir=(0, -1, 0), z_dir=(0, 0, -1))) as fillet_2_piece_1:
        with BuildLine():
            CenterArc((0.902635894, 2), FILLET_2_R, 226.658241773, 43.341758227)
            ThreePointArc((-0.470061276, 0.545454545), (-0.220966302, 0.284847622), (0, 0))
            Line((0, 0), (0.902635894, 0))
        make_face()
    extrude(amount=3)
    with BuildSketch(Plane(origin=(11.127718677, -16, 3), x_dir=(-1, 0, 0), z_dir=(0, 0, -1)), Plane(origin=(-16, -11.127718677, 3), x_dir=(0, 1, 0), z_dir=(0, 0, -1)), Plane(origin=(16, 11.127718677, 3), x_dir=(0, -1, 0), z_dir=(0, 0, -1))) as fillet_2_piece_2:
        with BuildLine():
            CenterArc((0.902635894, -2), FILLET_2_R, 90, 43.341758227)
            ThreePointArc((-0.470061276, -0.545454545), (-0.220966302, -0.284847622), (0, 0))
            Line((0, 0), (0.902635894, 0))
        make_face()
    extrude(amount=3)
    # the kernel refuses this fillet: 2 mm, written as the material it takes off along each edge
    with BuildSketch(Plane(origin=(-10, 16, 7.499392524), x_dir=(-1, 0, 0), z_dir=(0, 0, -1))) as fillet_2_2_piece_1:
        with BuildLine():
            CenterArc((2, -1.799757009), FILLET_2_R, 115.857898182, 64.142101818)
            Line((0, -1.799757009), (0, 0))
            Line((0, 0), (1.127718677, 0))
        make_face()
    extrude(amount=11.998785047, mode=Mode.SUBTRACT)
    with BuildSketch(Plane(origin=(10, 16, -4.499392524), x_dir=(0, -1, 0), z_dir=(0, 0, 1))) as fillet_2_2_piece_2:
        with BuildLine():
            CenterArc((1.799757009, 2), FILLET_2_R, 205.857898182, 64.142101818)
            Line((0, 1.127718677), (0, 0))
            Line((0, 0), (1.799757009, 0))
        make_face()
    extrude(amount=11.998785047, mode=Mode.SUBTRACT)


solid = part.part
